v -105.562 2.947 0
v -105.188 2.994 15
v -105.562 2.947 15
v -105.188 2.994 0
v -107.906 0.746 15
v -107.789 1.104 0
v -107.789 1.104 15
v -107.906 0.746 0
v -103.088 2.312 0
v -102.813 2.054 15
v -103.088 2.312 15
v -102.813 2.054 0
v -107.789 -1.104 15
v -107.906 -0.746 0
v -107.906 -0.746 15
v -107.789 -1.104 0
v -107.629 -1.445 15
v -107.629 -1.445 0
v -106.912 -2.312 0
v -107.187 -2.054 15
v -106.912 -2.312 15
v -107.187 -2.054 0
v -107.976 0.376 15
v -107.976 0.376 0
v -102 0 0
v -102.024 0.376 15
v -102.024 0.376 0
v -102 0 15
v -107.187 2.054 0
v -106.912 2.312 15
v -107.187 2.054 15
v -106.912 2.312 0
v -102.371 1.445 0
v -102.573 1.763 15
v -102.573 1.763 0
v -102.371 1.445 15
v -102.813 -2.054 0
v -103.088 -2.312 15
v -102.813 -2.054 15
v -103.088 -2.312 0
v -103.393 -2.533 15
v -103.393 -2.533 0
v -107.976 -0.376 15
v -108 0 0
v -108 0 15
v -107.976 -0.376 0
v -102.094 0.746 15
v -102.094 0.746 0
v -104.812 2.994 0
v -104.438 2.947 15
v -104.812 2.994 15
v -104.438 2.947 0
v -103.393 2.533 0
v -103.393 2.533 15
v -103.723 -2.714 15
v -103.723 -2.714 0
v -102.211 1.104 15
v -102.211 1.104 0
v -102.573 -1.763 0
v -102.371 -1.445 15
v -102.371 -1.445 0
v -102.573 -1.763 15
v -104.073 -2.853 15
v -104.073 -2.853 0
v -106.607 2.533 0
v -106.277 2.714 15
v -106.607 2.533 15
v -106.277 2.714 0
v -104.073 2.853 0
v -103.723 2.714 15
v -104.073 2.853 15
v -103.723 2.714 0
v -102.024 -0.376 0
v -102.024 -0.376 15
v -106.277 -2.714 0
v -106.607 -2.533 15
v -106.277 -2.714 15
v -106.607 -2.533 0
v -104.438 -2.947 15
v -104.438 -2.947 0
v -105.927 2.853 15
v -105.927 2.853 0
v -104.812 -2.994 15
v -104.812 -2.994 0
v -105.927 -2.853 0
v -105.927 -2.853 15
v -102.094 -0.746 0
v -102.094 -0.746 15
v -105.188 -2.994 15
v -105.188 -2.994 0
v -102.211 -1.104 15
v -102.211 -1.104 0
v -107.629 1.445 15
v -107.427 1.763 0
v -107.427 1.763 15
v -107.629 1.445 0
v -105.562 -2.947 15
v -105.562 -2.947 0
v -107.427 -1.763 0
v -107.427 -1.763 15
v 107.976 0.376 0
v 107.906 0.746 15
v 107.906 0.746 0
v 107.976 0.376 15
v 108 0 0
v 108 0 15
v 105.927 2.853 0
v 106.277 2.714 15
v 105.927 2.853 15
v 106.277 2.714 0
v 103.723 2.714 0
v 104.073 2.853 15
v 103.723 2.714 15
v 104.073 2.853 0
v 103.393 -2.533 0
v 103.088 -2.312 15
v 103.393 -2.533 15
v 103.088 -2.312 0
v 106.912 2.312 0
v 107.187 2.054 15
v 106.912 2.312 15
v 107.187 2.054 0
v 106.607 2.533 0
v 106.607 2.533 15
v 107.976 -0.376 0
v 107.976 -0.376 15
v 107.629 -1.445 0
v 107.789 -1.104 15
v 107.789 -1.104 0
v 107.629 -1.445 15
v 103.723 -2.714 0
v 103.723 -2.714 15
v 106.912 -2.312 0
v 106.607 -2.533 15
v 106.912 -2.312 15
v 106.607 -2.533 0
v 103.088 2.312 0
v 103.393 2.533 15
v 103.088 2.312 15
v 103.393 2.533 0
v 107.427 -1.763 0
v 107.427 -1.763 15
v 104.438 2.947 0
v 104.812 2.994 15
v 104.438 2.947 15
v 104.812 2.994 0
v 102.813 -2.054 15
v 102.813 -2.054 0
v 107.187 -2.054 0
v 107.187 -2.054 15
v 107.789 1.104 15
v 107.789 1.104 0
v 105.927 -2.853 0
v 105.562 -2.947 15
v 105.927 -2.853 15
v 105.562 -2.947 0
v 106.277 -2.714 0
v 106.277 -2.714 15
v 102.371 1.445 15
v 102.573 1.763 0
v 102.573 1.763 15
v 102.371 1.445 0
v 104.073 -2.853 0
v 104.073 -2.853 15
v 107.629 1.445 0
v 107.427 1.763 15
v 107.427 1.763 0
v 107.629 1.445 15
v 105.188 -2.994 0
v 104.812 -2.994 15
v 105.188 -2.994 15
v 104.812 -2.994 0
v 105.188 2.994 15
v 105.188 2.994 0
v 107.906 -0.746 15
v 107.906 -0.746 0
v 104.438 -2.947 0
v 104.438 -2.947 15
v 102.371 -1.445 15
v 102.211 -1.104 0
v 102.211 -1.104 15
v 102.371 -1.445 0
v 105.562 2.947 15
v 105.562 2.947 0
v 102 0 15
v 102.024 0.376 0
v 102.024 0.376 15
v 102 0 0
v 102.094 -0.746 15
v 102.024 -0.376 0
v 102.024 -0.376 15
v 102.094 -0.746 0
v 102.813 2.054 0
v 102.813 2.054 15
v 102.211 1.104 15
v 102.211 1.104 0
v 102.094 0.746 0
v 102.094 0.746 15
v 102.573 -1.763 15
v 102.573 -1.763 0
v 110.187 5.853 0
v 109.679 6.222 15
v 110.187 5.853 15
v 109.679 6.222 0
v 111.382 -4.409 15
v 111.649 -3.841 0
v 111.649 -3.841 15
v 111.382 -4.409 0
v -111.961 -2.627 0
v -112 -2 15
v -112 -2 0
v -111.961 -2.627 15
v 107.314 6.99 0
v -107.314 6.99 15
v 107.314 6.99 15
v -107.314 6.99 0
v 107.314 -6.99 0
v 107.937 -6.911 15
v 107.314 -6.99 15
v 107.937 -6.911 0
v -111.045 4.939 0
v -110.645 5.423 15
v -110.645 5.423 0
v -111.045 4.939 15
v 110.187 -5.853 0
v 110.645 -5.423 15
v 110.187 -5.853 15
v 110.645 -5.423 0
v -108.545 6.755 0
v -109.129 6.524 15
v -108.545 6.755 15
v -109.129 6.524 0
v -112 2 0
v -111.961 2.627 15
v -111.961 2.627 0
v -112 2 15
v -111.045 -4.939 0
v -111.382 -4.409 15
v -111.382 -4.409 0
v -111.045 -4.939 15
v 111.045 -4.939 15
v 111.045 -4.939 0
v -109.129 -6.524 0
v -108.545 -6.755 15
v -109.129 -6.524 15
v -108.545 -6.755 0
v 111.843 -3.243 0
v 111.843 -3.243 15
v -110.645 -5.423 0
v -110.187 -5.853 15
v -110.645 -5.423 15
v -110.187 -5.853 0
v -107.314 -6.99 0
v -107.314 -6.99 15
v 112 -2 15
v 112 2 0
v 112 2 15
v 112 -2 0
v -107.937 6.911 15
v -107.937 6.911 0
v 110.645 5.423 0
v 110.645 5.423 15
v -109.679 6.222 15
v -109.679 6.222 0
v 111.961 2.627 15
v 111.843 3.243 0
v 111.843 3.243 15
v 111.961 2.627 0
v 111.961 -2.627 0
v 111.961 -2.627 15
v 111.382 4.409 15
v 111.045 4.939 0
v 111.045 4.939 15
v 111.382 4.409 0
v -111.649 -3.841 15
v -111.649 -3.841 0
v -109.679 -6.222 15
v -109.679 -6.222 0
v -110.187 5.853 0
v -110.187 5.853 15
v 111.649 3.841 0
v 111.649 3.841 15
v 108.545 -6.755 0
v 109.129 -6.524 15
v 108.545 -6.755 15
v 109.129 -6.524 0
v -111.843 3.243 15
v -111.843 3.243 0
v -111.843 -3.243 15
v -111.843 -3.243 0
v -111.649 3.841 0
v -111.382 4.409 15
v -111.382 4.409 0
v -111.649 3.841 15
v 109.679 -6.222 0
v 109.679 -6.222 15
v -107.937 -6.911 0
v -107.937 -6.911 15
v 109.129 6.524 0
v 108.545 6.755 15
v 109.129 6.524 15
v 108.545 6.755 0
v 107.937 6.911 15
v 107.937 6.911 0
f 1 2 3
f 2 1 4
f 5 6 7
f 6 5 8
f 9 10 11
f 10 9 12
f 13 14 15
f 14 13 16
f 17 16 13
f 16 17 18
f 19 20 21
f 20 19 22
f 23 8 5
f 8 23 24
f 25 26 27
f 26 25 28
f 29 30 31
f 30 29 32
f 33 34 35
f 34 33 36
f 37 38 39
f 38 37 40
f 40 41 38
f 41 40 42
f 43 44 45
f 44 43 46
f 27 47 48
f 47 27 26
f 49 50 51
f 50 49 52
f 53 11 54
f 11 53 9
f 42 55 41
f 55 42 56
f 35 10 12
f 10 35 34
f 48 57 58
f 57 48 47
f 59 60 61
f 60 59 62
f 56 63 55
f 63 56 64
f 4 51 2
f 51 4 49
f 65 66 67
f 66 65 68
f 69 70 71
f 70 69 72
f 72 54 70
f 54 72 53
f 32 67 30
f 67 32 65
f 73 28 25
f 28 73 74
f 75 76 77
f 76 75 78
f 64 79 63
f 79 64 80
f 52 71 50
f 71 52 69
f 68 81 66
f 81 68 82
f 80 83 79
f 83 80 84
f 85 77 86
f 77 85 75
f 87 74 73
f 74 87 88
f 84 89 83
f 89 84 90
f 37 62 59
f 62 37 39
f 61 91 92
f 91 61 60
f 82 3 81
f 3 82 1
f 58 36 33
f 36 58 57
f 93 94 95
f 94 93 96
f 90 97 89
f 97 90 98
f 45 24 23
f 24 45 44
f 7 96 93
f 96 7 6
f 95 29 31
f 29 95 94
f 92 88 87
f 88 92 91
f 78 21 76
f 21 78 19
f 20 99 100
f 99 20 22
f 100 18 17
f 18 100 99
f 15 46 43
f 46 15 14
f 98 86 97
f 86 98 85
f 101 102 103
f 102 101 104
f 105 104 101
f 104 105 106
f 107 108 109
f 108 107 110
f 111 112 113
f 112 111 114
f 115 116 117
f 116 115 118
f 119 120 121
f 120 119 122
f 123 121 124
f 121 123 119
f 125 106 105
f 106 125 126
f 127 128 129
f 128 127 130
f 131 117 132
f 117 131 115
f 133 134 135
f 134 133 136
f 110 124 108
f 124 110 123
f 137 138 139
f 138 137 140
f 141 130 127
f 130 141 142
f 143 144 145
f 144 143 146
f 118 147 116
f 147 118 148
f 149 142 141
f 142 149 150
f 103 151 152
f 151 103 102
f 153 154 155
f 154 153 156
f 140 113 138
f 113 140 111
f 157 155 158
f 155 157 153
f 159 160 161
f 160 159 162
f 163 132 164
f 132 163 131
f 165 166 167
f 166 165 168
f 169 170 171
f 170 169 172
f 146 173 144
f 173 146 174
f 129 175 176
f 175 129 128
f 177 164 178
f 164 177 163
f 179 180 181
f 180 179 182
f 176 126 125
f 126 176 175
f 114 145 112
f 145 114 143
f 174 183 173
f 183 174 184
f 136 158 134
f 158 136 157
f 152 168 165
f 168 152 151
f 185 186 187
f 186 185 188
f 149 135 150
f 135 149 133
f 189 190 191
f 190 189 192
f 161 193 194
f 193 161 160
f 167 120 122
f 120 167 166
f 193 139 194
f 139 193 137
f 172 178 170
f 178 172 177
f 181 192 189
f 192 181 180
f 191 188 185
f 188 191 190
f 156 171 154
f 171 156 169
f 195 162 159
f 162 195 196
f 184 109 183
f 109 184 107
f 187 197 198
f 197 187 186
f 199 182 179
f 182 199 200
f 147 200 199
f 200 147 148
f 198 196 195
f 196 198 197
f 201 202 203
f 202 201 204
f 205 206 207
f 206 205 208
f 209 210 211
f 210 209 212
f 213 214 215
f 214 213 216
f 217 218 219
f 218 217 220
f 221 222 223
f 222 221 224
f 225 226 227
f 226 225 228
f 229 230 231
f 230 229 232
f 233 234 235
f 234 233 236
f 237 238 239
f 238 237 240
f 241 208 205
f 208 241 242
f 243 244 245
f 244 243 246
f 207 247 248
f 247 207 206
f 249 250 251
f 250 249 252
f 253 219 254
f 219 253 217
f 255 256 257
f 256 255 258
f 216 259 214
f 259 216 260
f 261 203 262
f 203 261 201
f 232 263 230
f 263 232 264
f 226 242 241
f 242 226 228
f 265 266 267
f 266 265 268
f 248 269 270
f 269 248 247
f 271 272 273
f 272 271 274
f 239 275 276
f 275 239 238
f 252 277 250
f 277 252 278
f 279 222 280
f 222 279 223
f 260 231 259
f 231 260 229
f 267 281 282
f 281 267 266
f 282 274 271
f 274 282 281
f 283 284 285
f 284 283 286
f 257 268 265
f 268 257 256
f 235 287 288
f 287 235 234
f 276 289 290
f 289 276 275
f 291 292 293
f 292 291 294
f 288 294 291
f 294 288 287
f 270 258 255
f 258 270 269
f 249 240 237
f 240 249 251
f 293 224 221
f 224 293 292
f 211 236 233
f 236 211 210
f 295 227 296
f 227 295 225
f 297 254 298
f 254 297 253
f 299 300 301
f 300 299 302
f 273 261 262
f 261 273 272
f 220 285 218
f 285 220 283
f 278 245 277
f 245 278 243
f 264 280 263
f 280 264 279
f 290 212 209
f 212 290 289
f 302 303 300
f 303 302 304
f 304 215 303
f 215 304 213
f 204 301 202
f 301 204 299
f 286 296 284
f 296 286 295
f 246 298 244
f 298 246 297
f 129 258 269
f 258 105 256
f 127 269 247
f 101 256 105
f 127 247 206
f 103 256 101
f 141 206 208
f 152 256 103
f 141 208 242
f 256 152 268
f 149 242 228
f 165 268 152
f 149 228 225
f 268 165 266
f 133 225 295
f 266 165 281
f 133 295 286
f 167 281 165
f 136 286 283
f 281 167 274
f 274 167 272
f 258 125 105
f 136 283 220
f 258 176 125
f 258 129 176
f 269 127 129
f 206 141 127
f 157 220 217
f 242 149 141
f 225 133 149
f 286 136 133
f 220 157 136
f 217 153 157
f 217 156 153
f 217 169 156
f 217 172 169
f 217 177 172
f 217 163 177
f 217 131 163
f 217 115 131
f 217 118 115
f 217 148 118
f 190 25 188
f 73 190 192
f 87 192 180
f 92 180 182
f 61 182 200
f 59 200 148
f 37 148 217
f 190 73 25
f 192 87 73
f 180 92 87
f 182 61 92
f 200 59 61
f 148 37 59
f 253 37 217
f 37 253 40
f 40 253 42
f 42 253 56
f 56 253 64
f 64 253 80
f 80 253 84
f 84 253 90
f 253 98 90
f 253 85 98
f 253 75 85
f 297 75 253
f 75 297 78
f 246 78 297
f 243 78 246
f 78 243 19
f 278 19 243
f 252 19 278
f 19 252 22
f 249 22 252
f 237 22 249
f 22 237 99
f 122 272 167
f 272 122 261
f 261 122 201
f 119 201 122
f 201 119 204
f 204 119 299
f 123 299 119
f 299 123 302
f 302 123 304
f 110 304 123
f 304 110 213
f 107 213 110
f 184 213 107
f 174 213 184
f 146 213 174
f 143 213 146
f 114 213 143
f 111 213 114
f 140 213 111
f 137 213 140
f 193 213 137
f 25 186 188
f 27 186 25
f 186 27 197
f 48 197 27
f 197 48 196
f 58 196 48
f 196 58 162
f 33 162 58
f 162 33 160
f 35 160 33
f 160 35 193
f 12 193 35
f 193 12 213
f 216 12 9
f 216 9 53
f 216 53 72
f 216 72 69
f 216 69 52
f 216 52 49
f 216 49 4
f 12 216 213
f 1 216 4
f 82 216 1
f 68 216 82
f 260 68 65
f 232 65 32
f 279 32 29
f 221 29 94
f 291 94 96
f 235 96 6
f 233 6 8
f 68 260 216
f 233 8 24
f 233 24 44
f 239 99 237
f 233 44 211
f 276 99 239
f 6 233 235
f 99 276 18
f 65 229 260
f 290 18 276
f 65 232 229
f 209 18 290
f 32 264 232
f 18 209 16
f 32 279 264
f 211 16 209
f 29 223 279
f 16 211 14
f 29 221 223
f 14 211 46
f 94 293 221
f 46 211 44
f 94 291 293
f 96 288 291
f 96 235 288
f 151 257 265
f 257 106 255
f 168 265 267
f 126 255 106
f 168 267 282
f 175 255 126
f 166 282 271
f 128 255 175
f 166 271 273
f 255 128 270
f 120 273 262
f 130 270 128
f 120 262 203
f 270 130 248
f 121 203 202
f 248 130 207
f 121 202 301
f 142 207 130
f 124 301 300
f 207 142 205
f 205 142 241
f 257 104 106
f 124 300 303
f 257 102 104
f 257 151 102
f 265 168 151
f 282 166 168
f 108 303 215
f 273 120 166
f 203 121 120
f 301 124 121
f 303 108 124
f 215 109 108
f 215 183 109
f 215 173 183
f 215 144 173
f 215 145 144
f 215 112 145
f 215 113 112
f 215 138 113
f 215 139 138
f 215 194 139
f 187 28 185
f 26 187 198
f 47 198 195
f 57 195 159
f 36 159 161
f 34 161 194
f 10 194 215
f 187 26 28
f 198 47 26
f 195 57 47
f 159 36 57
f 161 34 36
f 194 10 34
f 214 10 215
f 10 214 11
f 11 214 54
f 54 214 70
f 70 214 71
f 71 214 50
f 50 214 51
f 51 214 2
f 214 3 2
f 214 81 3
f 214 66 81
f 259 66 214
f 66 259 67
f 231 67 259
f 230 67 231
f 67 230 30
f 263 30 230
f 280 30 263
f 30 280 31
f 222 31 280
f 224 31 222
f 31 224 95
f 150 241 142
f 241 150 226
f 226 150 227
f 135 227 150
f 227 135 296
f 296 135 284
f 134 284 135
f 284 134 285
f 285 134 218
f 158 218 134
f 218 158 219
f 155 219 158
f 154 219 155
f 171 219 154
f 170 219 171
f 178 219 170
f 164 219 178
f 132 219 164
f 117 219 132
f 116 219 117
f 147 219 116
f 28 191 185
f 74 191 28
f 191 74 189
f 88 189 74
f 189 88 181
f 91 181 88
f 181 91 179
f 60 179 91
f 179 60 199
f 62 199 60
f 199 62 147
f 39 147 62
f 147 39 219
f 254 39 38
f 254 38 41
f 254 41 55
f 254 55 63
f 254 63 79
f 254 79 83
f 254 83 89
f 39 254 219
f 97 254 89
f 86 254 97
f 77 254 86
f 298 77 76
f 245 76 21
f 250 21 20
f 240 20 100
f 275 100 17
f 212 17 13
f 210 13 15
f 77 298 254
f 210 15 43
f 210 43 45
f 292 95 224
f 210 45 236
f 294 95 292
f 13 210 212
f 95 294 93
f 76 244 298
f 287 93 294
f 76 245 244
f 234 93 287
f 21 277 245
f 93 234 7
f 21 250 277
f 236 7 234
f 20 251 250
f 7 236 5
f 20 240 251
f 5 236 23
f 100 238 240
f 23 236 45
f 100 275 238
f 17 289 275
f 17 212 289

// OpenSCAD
$fn = 50;


difference() {
	union() {
		hull() {
			translate(v = [-107.0000000000, 2.0000000000, 0]) {
				cylinder(h = 15, r = 5);
			}
			translate(v = [107.0000000000, 2.0000000000, 0]) {
				cylinder(h = 15, r = 5);
			}
			translate(v = [-107.0000000000, -2.0000000000, 0]) {
				cylinder(h = 15, r = 5);
			}
			translate(v = [107.0000000000, -2.0000000000, 0]) {
				cylinder(h = 15, r = 5);
			}
		}
	}
	union() {
		translate(v = [-105.0000000000, 0.0000000000, -100.0000000000]) {
			cylinder(h = 200, r = 3.0000000000);
		}
		translate(v = [-105.0000000000, 0.0000000000, -100.0000000000]) {
			cylinder(h = 200, r = 3.0000000000);
		}
		translate(v = [105.0000000000, 0.0000000000, -100.0000000000]) {
			cylinder(h = 200, r = 3.0000000000);
		}
		translate(v = [105.0000000000, 0.0000000000, -100.0000000000]) {
			cylinder(h = 200, r = 3.0000000000);
		}
	}
}
